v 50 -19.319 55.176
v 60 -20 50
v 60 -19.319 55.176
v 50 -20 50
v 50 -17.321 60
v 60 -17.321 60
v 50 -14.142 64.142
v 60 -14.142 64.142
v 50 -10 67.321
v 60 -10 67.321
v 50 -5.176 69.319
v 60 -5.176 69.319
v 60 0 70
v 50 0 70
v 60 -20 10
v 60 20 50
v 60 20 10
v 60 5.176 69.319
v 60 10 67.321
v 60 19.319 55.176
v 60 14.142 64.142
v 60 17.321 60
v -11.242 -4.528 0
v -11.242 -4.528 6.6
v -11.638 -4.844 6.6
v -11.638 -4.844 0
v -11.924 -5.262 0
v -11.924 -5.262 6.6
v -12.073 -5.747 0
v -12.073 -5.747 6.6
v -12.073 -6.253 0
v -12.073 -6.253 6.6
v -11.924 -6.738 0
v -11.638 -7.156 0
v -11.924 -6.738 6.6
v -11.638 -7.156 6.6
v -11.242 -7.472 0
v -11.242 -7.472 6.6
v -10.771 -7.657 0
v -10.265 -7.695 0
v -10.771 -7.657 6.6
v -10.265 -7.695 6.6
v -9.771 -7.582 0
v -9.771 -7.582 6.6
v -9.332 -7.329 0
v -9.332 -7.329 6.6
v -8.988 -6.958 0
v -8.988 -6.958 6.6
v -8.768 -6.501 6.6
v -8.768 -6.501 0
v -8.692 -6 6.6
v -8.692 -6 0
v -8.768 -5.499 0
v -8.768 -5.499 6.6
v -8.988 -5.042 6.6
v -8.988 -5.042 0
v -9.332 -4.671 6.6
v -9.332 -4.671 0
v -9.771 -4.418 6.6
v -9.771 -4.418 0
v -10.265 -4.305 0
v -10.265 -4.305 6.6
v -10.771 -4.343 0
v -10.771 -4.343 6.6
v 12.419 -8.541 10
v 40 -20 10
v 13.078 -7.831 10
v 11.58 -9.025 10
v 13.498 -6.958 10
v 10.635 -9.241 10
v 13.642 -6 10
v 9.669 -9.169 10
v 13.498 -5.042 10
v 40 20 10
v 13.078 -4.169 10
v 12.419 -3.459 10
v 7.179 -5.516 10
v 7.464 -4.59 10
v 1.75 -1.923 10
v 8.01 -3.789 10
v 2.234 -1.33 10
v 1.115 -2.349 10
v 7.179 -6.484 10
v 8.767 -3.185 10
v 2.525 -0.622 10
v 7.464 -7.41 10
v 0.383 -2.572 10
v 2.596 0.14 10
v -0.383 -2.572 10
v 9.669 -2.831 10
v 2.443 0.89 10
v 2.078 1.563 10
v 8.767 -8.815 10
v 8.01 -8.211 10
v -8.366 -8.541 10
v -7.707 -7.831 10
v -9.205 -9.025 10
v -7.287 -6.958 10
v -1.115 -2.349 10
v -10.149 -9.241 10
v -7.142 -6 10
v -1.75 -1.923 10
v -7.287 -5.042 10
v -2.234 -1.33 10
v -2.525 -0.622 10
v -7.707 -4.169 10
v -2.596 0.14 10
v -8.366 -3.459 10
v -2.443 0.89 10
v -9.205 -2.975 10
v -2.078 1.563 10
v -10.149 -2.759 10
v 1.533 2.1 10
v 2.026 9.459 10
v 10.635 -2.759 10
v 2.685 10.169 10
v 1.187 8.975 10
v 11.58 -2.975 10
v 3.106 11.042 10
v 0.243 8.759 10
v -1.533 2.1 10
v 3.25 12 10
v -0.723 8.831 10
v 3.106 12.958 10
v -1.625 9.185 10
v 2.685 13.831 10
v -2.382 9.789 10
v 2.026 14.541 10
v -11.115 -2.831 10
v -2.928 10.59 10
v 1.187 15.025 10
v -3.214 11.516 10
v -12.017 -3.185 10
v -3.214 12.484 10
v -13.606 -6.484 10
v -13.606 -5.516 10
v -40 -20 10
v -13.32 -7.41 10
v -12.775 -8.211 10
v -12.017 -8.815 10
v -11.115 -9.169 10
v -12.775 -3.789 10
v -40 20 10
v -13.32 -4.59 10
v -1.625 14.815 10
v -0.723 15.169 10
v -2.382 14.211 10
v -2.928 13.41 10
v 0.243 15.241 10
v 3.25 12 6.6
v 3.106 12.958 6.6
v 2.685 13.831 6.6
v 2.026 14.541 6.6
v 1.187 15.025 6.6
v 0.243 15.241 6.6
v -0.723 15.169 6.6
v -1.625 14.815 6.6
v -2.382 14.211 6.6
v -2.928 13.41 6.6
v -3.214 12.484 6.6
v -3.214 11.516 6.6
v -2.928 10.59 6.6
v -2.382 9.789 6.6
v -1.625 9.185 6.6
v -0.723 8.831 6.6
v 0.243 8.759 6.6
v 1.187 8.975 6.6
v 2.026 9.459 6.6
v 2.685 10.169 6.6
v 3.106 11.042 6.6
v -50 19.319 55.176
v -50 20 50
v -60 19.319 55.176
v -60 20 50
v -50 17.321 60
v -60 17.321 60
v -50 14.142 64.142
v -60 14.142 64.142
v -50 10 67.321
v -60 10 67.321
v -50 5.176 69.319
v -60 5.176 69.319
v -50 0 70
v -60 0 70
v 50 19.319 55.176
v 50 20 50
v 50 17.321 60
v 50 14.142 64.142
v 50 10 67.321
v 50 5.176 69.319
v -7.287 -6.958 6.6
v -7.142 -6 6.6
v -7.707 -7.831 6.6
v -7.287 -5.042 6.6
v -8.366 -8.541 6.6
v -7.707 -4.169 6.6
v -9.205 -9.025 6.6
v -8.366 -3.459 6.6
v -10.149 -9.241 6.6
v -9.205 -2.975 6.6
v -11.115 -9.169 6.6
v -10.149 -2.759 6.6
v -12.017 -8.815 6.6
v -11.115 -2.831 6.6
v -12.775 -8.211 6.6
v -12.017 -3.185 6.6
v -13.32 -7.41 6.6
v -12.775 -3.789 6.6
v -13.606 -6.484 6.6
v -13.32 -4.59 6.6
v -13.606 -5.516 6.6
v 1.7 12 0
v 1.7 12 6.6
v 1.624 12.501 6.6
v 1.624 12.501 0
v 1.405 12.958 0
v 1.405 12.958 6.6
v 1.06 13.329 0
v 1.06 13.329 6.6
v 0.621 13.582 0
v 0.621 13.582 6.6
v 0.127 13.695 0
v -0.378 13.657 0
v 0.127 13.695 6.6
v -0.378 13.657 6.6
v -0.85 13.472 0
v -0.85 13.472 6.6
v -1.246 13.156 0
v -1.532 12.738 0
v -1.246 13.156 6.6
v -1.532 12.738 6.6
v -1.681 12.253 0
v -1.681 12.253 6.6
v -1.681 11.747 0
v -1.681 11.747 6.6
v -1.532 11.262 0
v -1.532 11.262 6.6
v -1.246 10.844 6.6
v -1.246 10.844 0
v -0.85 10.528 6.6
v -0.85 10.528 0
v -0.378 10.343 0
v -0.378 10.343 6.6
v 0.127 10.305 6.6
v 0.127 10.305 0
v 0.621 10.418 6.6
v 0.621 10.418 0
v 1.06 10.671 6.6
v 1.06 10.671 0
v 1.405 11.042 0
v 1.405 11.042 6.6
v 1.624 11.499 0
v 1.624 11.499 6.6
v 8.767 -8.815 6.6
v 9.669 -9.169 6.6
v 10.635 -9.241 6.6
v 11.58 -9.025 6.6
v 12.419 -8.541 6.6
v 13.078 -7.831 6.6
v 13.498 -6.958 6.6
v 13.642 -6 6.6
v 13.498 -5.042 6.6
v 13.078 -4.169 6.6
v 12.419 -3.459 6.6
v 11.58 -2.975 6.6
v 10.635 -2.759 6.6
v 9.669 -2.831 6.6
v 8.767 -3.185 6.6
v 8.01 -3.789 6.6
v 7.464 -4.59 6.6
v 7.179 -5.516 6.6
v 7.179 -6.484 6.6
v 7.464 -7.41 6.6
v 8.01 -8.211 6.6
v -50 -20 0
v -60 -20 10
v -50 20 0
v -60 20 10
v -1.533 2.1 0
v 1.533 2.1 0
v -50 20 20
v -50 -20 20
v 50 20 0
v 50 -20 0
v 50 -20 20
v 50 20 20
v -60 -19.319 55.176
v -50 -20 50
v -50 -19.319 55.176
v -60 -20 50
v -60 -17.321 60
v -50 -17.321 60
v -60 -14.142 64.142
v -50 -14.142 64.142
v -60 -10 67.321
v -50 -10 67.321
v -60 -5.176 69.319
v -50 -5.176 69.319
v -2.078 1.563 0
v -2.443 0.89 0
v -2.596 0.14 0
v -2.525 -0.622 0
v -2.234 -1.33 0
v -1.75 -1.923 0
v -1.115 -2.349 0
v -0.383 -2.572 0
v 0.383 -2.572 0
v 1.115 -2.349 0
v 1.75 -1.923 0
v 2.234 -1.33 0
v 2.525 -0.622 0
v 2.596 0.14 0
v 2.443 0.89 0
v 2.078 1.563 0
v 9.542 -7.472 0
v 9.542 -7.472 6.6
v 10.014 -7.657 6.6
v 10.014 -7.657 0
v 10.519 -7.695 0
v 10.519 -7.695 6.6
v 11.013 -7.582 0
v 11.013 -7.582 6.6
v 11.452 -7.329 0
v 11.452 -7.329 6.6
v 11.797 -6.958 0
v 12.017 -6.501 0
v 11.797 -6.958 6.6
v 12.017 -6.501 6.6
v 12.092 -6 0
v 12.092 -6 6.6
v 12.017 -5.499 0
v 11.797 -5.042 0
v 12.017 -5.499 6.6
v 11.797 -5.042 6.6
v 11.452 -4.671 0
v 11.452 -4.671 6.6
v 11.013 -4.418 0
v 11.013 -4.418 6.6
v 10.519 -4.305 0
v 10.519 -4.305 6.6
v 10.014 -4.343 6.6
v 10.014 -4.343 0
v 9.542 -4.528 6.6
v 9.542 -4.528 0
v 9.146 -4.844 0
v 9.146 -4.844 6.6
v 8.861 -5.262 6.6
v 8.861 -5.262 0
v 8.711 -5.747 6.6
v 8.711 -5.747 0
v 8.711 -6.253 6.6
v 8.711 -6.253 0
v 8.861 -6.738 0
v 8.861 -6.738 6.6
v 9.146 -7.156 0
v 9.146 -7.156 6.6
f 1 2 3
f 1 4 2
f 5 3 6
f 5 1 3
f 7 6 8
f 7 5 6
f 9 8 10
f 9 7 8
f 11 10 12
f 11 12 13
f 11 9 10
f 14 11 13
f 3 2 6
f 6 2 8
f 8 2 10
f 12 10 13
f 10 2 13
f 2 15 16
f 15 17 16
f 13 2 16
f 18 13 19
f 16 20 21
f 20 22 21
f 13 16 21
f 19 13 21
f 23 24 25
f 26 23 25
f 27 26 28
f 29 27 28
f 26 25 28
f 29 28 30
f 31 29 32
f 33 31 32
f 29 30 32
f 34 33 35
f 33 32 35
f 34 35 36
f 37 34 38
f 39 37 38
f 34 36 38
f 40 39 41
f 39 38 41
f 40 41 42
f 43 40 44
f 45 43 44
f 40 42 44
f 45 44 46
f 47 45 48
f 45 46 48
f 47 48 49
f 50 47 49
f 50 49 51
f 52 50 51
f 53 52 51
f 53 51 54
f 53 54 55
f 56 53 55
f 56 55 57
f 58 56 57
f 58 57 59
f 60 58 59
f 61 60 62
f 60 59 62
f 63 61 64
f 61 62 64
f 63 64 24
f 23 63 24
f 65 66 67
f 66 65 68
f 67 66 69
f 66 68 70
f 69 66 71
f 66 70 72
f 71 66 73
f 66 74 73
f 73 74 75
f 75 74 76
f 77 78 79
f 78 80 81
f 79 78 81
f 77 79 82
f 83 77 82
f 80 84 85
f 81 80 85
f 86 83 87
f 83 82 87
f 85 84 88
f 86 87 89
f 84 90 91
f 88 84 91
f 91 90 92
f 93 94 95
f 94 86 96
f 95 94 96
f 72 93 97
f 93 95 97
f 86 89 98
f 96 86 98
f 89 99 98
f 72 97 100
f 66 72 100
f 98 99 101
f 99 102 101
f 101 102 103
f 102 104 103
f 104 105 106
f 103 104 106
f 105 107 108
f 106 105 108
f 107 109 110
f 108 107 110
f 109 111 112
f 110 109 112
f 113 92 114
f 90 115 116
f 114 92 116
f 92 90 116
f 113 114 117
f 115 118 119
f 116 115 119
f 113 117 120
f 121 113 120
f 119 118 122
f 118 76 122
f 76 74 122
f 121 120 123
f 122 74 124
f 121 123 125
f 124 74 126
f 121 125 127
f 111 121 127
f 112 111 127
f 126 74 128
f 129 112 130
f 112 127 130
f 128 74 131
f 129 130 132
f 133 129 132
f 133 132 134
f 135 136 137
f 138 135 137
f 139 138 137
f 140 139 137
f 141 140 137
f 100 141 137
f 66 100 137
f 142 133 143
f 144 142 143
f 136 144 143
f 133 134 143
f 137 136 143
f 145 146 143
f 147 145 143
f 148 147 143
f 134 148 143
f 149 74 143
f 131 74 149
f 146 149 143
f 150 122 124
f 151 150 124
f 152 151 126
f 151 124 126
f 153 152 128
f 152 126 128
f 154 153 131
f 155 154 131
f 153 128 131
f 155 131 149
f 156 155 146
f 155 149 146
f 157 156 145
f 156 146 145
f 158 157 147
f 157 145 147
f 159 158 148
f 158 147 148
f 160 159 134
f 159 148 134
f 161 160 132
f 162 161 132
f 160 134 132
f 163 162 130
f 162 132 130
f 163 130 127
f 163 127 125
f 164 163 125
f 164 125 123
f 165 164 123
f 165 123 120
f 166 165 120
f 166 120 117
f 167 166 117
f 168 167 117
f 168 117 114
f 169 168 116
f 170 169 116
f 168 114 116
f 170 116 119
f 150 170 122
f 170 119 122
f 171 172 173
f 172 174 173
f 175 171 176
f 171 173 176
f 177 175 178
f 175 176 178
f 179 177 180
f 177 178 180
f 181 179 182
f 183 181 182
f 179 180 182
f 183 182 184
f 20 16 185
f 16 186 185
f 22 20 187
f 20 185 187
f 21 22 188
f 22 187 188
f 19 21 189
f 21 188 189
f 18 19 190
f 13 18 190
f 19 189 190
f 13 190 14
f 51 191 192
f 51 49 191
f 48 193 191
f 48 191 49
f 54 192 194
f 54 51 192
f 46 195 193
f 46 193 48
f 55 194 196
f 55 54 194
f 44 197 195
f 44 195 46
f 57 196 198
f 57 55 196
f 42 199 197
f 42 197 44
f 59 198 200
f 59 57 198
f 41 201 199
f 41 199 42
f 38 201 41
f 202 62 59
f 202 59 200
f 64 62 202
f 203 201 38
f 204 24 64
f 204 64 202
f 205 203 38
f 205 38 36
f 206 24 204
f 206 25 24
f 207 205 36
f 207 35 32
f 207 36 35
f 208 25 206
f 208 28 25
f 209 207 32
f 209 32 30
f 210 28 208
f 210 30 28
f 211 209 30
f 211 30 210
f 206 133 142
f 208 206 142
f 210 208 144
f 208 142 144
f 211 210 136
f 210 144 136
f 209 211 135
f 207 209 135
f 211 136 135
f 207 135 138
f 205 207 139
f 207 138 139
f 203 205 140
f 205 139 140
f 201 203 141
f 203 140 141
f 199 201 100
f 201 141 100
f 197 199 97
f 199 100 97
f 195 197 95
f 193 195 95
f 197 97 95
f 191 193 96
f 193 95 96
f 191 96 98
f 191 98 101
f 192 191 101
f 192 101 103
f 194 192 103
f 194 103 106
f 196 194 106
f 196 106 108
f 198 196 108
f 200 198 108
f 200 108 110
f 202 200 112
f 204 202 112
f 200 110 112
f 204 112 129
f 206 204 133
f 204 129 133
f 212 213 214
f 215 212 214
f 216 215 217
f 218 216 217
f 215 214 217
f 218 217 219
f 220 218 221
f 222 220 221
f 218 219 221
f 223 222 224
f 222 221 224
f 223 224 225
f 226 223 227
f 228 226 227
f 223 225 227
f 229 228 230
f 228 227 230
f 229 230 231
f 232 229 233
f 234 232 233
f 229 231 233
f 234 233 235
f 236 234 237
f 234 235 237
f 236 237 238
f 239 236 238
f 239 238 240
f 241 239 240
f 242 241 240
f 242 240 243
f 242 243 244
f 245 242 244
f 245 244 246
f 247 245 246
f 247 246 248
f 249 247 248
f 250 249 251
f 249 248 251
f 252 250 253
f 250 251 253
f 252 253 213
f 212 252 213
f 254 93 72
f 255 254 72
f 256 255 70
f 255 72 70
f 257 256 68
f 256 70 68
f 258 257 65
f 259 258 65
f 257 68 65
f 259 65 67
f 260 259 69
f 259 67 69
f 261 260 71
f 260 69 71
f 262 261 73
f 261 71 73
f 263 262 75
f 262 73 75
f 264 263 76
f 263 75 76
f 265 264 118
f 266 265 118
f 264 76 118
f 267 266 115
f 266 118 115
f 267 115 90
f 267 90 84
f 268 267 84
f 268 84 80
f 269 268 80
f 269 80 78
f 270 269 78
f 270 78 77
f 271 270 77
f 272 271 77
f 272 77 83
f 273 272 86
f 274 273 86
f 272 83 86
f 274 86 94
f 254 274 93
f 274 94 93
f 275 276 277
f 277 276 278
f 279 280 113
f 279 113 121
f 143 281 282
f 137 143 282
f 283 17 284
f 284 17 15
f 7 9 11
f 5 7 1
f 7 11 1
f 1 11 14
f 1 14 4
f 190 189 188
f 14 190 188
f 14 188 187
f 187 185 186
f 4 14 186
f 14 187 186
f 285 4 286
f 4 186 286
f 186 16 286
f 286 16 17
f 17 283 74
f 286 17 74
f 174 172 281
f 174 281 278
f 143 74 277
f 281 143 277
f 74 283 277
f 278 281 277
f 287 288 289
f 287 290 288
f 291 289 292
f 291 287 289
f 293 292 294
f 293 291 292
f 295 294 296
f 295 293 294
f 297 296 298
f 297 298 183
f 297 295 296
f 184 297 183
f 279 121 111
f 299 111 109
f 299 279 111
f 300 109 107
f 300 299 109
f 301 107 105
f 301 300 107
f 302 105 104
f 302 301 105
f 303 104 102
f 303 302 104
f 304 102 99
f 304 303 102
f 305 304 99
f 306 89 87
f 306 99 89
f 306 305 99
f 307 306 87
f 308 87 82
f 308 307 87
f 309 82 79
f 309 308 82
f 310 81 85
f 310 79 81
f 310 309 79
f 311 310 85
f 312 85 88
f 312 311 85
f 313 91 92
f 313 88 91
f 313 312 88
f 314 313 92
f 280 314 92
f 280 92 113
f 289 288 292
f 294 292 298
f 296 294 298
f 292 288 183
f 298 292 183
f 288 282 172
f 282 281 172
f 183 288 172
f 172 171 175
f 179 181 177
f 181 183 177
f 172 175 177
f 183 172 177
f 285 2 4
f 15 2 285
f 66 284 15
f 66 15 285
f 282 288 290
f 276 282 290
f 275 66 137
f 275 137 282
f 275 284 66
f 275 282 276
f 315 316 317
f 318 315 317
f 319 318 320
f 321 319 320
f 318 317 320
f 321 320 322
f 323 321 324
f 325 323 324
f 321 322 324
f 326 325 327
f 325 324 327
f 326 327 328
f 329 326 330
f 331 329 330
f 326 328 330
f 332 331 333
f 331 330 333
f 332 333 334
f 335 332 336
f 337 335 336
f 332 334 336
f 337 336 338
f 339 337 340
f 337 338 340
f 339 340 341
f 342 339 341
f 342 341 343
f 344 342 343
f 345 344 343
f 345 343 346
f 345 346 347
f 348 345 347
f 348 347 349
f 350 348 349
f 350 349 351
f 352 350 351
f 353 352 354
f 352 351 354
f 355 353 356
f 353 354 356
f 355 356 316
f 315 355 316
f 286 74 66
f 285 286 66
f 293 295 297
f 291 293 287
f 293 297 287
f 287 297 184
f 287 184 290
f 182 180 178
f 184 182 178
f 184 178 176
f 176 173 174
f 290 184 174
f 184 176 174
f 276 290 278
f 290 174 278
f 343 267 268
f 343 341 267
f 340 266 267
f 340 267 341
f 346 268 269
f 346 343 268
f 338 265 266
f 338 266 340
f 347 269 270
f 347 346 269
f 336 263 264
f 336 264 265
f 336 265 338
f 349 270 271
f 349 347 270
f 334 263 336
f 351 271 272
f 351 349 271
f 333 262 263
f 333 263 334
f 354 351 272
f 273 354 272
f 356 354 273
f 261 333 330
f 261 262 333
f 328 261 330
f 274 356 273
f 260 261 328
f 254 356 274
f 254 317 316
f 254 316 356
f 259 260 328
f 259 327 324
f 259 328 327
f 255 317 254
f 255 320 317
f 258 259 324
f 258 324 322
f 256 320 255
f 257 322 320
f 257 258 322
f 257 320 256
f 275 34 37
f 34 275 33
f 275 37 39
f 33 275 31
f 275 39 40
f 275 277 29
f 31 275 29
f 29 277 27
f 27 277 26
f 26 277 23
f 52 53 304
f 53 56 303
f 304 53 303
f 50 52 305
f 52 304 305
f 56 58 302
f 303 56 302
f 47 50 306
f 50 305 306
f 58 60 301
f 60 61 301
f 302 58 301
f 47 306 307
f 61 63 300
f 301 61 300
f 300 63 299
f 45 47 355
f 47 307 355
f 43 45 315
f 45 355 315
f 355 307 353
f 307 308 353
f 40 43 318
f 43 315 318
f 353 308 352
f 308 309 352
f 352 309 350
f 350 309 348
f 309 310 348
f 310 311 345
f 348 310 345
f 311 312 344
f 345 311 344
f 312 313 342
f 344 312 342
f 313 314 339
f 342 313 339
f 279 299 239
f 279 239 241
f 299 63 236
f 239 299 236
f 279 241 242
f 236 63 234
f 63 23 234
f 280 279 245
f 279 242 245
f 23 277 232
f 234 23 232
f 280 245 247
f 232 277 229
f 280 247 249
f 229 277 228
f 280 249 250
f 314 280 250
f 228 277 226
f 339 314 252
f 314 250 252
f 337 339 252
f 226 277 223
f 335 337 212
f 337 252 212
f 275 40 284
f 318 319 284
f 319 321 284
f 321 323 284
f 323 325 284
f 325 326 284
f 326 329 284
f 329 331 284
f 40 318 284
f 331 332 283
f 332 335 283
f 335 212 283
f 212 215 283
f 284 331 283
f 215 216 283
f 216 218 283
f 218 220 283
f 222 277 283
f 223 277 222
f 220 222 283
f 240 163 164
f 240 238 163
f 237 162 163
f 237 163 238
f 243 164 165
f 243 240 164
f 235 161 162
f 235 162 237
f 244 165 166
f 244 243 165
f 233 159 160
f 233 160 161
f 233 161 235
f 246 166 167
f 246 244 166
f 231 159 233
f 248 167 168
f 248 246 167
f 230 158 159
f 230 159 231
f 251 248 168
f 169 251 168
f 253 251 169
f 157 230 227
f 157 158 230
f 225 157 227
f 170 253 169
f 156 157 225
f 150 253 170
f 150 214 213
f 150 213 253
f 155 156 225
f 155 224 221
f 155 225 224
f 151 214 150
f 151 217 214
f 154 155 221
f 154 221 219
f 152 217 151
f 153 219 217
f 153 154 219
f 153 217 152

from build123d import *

# Parameters (mm, degrees)
AUFSATZ_LINEAR_AUSTRAGEN1_DEPTH = 20
SCHNITT_LINEAR_AUSTRAGEN1_DEPTH = 20
FASE1_SIZE                      = 10
VERRUNDUNG1_R                   = 20
SKIZZE3_R                       = 3.25
SCHNITT_LINEAR_AUSTRAGEN2_DEPTH = 3.4
SKIZZE4_R                       = 1.7
SCHNITT_LINEAR_AUSTRAGEN3_DEPTH = 6.6
KREISMUSTER1_COUNT              = 3


with BuildPart() as part:
    # Skizze1 → Aufsatz-Linear austragen1 (new, symmetric)
    with BuildSketch(Plane(origin=(0, 0, 0), x_dir=(1, 0, 0), z_dir=(0, 1, 0))):
        Polygon((-60, 0), (60, 0), (60, -70), (50, -70), (50, -10), (-50, -10), (-50, -70), (-60, -70), align=None)
    extrude(amount=AUFSATZ_LINEAR_AUSTRAGEN1_DEPTH, both=True)

    # Skizze2 → Schnitt-Linear austragen1 (cut)
    with BuildSketch(Plane(origin=(0, 0, 0), x_dir=(-1, 0, 0), z_dir=(0, 0, -1))):
        with BuildLine():
            Line((-1.532970972, 2.1), (1.532970972, 2.1))
            ThreePointArc((1.532970972, 2.1), (0, -2.6), (-1.532970972, 2.1))
        make_face()
    extrude(amount=-SCHNITT_LINEAR_AUSTRAGEN1_DEPTH, mode=Mode.SUBTRACT)

    # Fase1
    fase1_edges = [part.edges().sort_by_distance(p)[0] for p in [
        (-60, 0, 0),
        (60, 0, 0),
        (50, 0, 10),
        (-50, 0, 10),
    ]]
    chamfer(fase1_edges, length=FASE1_SIZE)

    # Verrundung1
    verrundung1_edges = [part.edges().sort_by_distance(p)[0] for p in [
        (-55, -20, 70),
        (-55, 20, 70),
        (55, 20, 70),
        (55, -20, 70),
    ]]
    fillet(verrundung1_edges, radius=VERRUNDUNG1_R - 0.0001)  # a hair under: the kernel refuses the full size

    # Skizze3 → Schnitt-Linear austragen2 (cut)
    with BuildSketch(Plane.XY.offset(10)):
        with Locations((0, 12)):
            Circle(SKIZZE3_R)
    schnitt_linear_austragen2 = extrude(amount=-SCHNITT_LINEAR_AUSTRAGEN2_DEPTH, mode=Mode.SUBTRACT)

    # Skizze4 → Schnitt-Linear austragen3 (cut)
    with BuildSketch(Plane.XY.offset(6.6)):
        with Locations((0, 12)):
            Circle(SKIZZE4_R)
    schnitt_linear_austragen3 = extrude(amount=-SCHNITT_LINEAR_AUSTRAGEN3_DEPTH, mode=Mode.SUBTRACT)

    # Kreismuster1: Schnitt-Linear austragen2, Schnitt-Linear austragen3 ×3 about axis
    kreismuster1_axis = Axis((0, 0, 0), (0, 0, 1))
    add([schnitt_linear_austragen2.rotate(kreismuster1_axis, i * 360 / KREISMUSTER1_COUNT) for i in range(1, KREISMUSTER1_COUNT)], mode=Mode.SUBTRACT)
    add([schnitt_linear_austragen3.rotate(kreismuster1_axis, i * 360 / KREISMUSTER1_COUNT) for i in range(1, KREISMUSTER1_COUNT)], mode=Mode.SUBTRACT)


solid = part.part
